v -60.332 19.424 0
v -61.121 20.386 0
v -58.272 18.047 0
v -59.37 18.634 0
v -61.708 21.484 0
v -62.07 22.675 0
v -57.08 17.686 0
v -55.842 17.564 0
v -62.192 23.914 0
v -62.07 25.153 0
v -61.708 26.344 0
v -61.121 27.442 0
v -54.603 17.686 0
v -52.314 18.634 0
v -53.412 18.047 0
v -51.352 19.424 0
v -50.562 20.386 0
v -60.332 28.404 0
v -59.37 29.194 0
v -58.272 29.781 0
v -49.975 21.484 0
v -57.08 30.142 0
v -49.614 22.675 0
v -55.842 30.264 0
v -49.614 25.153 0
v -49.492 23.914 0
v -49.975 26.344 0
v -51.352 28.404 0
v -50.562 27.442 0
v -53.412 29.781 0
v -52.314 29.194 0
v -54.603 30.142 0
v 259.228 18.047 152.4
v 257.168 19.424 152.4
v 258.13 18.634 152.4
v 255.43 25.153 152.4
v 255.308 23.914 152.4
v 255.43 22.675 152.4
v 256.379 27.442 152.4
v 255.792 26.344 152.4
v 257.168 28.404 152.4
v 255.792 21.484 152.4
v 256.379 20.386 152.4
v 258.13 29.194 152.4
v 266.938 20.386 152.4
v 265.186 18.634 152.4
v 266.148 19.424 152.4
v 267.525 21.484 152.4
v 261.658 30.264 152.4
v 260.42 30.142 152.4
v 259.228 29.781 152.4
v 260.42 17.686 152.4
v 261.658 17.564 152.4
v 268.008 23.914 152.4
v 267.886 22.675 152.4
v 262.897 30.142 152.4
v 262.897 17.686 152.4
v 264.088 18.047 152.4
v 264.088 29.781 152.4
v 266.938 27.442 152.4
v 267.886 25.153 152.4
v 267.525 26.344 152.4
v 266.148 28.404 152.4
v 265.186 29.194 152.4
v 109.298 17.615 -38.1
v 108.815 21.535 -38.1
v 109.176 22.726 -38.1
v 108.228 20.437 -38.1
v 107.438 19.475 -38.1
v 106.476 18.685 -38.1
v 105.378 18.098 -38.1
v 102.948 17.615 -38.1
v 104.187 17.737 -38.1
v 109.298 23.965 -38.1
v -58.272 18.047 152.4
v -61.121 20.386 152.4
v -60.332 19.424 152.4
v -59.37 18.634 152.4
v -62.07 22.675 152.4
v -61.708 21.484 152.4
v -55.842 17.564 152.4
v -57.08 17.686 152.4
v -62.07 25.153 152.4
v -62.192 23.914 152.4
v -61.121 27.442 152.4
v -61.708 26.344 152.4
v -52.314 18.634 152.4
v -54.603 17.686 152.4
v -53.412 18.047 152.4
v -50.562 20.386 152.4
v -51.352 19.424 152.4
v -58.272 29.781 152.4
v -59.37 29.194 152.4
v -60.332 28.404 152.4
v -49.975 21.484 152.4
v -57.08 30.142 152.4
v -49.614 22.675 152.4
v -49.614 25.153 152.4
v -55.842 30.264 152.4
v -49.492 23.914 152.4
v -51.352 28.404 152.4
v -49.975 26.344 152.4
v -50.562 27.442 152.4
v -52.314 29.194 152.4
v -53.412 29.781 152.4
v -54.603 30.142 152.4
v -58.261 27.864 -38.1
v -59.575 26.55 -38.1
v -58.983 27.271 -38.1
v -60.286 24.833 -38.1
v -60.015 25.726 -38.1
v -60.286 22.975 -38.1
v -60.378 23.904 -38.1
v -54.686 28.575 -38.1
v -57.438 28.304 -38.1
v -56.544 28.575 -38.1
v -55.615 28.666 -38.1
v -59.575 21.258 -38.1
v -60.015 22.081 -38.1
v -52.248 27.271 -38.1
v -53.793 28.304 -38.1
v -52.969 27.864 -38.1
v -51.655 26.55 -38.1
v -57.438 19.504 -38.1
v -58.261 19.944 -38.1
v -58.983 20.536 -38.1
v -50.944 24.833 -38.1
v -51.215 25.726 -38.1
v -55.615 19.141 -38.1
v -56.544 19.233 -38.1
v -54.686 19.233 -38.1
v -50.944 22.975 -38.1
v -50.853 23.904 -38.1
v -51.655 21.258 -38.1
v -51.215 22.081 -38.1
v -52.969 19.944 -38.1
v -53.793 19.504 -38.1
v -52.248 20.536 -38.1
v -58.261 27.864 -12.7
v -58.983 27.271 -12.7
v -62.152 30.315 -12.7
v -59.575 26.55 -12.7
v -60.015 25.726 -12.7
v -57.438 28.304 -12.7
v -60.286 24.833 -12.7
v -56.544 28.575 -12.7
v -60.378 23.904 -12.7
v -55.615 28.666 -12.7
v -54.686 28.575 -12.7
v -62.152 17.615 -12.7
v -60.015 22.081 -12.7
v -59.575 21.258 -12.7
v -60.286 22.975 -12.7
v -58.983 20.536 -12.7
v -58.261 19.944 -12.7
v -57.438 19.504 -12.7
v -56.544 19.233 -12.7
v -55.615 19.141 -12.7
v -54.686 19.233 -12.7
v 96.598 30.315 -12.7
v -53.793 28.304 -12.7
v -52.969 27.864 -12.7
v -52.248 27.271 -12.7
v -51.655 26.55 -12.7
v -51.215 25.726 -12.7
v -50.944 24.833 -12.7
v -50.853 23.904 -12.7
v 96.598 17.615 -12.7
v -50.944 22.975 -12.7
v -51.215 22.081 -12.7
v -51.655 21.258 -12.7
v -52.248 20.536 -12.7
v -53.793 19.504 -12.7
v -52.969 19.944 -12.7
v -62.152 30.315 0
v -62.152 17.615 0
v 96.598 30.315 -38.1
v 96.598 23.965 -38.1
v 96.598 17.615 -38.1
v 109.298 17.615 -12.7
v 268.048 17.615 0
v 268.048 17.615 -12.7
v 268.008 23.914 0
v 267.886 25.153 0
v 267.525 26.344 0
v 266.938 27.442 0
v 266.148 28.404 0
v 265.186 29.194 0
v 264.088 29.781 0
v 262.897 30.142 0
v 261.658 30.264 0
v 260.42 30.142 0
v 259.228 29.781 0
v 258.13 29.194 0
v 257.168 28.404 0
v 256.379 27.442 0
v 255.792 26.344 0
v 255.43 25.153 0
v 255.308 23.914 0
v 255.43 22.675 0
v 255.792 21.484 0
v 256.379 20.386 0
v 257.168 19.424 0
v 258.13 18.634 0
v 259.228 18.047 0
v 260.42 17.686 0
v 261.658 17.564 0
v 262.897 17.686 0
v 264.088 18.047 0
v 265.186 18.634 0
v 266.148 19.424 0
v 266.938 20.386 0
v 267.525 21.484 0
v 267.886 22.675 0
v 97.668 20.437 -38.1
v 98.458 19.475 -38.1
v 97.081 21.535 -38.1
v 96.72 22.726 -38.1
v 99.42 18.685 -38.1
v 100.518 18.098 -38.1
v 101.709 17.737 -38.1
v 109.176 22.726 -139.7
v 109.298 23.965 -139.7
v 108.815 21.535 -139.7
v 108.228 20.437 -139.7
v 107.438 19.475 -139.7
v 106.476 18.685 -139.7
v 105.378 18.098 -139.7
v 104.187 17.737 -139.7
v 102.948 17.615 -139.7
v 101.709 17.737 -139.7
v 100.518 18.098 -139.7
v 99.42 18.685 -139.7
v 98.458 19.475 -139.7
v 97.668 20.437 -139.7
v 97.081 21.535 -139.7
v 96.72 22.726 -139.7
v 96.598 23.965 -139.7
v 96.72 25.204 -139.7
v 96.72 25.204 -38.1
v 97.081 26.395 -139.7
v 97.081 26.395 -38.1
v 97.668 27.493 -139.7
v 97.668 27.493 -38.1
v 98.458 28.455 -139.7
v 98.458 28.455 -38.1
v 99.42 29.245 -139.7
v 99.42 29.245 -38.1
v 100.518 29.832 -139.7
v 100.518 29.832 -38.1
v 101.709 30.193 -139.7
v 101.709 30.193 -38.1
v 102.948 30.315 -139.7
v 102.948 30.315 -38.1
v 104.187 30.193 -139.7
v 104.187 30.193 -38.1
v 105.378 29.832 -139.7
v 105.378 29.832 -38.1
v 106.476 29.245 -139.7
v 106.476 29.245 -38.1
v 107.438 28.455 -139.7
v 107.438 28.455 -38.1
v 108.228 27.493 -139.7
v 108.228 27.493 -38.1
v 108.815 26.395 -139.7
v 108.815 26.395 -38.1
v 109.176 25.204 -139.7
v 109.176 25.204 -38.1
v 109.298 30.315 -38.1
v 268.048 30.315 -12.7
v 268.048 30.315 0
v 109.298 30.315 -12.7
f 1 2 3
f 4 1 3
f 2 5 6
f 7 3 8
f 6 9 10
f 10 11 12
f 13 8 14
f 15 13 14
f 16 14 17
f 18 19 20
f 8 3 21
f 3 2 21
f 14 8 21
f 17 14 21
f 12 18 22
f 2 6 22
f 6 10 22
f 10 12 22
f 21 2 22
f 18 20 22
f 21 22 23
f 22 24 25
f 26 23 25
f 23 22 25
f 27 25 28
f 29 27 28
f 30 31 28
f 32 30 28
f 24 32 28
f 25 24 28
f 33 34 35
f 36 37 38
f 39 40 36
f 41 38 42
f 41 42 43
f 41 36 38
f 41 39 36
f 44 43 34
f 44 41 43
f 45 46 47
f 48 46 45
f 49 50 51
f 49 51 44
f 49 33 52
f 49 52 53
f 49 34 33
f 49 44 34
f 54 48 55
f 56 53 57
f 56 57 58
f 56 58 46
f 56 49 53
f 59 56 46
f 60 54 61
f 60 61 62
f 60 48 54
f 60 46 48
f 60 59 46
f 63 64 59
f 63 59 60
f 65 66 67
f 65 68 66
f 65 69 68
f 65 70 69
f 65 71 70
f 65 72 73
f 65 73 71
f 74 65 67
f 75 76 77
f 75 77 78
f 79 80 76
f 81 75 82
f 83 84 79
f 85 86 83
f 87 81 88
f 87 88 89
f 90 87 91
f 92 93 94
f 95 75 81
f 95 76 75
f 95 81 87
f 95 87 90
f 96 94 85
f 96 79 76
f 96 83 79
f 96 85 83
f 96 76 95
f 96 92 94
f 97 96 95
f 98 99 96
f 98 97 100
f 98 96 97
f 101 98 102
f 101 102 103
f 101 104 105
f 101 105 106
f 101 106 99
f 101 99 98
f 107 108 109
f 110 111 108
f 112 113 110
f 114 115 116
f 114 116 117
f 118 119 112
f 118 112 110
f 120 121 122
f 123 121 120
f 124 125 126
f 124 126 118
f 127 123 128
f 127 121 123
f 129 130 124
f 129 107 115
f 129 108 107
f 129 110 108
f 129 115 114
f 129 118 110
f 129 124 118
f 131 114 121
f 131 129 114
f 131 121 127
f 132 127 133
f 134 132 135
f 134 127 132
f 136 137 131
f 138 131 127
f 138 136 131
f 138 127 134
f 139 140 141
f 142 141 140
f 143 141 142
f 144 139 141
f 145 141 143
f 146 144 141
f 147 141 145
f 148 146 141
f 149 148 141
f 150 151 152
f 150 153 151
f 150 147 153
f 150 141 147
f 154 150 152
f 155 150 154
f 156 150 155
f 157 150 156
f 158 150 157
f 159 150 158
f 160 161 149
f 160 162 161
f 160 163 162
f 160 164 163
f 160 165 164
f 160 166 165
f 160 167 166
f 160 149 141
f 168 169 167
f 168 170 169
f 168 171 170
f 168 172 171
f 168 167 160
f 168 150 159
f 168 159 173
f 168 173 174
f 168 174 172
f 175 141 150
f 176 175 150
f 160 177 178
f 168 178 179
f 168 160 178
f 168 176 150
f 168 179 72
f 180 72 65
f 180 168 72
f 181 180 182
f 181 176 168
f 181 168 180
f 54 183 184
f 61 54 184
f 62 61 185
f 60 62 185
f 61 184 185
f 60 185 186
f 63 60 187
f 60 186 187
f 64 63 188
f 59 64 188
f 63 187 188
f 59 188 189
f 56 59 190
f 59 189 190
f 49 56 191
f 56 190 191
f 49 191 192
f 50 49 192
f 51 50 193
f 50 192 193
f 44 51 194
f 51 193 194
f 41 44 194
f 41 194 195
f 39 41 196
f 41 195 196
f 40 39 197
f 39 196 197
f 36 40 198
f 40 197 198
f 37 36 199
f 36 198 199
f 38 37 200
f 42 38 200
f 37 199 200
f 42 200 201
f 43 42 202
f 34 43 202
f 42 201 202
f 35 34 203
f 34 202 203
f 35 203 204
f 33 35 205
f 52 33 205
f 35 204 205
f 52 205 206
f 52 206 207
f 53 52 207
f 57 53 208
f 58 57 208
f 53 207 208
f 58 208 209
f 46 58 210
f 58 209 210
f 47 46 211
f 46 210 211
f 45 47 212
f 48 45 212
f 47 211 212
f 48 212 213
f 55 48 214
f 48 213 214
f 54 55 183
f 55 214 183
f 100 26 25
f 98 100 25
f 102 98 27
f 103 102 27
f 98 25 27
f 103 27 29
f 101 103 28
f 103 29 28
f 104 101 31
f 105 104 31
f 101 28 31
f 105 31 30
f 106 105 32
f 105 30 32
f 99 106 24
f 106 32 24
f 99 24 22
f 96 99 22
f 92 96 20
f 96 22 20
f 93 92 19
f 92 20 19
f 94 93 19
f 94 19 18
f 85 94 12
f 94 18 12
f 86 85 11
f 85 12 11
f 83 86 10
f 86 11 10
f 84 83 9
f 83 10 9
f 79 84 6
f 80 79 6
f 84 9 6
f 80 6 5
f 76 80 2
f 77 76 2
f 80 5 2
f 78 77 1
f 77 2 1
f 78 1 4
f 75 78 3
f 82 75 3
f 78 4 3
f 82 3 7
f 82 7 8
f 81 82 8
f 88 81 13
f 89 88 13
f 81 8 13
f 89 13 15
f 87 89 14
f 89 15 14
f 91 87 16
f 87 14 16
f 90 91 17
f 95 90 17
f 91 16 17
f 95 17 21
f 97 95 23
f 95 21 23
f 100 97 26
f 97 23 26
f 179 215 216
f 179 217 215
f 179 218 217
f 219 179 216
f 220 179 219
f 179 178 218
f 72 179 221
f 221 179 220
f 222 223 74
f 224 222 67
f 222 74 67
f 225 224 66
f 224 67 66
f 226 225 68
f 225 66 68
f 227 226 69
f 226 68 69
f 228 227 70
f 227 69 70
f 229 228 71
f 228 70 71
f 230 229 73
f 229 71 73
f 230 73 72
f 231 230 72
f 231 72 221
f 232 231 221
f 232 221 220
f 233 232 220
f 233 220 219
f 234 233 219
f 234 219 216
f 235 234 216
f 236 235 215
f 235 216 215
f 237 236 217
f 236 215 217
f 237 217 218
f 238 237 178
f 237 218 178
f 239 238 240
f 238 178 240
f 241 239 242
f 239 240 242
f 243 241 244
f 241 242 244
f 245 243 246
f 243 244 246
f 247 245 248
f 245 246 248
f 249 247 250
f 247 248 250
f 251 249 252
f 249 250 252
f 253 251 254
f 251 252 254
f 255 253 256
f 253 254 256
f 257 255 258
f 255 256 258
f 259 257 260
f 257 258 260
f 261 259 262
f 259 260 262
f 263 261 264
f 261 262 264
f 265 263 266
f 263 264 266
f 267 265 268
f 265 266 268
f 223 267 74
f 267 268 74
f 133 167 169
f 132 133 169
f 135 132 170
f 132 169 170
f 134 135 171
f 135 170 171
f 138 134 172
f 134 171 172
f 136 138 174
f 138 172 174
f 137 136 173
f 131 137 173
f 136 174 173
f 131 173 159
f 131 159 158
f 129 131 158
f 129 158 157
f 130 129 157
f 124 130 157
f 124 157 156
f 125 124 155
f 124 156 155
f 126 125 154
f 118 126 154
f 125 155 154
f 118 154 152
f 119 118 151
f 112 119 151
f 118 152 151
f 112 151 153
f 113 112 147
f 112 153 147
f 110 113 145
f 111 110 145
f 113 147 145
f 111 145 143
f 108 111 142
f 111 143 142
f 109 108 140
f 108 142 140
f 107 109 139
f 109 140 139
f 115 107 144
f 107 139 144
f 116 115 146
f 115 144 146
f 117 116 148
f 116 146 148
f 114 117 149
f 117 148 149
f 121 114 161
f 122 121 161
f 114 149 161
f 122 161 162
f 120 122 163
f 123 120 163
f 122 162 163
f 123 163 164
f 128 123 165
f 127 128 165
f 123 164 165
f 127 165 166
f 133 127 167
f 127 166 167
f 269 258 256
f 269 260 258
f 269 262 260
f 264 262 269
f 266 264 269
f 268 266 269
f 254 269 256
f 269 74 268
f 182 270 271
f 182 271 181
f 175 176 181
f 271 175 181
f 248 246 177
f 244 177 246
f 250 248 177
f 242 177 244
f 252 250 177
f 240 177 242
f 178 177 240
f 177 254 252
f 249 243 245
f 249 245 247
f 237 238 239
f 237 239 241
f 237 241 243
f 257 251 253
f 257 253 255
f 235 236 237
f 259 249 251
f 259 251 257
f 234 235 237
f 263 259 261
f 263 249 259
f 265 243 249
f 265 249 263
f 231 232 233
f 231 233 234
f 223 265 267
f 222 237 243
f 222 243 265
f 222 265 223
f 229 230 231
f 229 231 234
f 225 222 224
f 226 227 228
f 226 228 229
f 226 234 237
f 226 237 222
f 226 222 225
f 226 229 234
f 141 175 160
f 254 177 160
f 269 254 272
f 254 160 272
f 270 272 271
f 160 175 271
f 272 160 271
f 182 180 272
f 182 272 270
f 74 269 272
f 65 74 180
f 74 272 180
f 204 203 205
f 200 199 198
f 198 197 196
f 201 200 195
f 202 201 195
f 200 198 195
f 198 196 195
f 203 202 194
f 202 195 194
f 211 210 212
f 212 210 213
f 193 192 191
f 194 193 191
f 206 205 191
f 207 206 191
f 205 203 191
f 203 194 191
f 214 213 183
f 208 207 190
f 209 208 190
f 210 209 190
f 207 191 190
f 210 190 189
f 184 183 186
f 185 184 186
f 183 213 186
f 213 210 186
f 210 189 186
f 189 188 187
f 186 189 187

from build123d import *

# Parameters (mm, degrees)
F0_R     = 6.35
F1_DEPTH = 152.4
F2_W     = 330.2
F2_H     = 12.7
F3_DEPTH = 12.7
F5_R     = 4.7625
F6_DEPTH = 25.4
F4_W     = 12.7
F4_H     = 12.7
F7_DEPTH = 25.4
F8_R     = 6.35
F9_DEPTH = 101.6


with BuildPart() as f1:
    # F0 (on Top) → F1 (new body)
    with BuildSketch(Plane.XY):
        with Locations((261.65836, 23.913959)):
            Circle(F0_R)
        with Locations((-55.84164, 23.913959)):
            Circle(F0_R)
    extrude(amount=F1_DEPTH)


with BuildPart() as f3:
    # F2 (on face) → F3 (new body)
    with BuildSketch(Plane(origin=(0, 0, 0), x_dir=(1, 0, 0), z_dir=(0, 0, -1))):
        with Locations((102.948088, -23.964958)):
            Rectangle(F2_W, F2_H)
    extrude(amount=F3_DEPTH)

    # F5 (on face) → F6 (join)
    with BuildSketch(Plane(origin=(0, 0, -12.7), x_dir=(1, 0, 0), z_dir=(0, 0, -1))):
        with Locations((-55.615186, -23.903887)):
            Circle(F5_R)
    extrude(amount=F6_DEPTH)

    # F4 (on face) → F7 (join)
    with BuildSketch(Plane(origin=(0, 0, -12.7), x_dir=(1, 0, 0), z_dir=(0, 0, -1))):
        with Locations((102.948088, -23.964958)):
            Rectangle(F4_W, F4_H)
    extrude(amount=F7_DEPTH)

    # F8 (on face) → F9 (join)
    with BuildSketch(Plane(origin=(0, 0, -38.1), x_dir=(1, 0, 0), z_dir=(0, 0, -1))):
        with Locations((102.948088, -23.964958)):
            Circle(F8_R)
    extrude(amount=F9_DEPTH)


solid = Compound([f1.part, f3.part])
